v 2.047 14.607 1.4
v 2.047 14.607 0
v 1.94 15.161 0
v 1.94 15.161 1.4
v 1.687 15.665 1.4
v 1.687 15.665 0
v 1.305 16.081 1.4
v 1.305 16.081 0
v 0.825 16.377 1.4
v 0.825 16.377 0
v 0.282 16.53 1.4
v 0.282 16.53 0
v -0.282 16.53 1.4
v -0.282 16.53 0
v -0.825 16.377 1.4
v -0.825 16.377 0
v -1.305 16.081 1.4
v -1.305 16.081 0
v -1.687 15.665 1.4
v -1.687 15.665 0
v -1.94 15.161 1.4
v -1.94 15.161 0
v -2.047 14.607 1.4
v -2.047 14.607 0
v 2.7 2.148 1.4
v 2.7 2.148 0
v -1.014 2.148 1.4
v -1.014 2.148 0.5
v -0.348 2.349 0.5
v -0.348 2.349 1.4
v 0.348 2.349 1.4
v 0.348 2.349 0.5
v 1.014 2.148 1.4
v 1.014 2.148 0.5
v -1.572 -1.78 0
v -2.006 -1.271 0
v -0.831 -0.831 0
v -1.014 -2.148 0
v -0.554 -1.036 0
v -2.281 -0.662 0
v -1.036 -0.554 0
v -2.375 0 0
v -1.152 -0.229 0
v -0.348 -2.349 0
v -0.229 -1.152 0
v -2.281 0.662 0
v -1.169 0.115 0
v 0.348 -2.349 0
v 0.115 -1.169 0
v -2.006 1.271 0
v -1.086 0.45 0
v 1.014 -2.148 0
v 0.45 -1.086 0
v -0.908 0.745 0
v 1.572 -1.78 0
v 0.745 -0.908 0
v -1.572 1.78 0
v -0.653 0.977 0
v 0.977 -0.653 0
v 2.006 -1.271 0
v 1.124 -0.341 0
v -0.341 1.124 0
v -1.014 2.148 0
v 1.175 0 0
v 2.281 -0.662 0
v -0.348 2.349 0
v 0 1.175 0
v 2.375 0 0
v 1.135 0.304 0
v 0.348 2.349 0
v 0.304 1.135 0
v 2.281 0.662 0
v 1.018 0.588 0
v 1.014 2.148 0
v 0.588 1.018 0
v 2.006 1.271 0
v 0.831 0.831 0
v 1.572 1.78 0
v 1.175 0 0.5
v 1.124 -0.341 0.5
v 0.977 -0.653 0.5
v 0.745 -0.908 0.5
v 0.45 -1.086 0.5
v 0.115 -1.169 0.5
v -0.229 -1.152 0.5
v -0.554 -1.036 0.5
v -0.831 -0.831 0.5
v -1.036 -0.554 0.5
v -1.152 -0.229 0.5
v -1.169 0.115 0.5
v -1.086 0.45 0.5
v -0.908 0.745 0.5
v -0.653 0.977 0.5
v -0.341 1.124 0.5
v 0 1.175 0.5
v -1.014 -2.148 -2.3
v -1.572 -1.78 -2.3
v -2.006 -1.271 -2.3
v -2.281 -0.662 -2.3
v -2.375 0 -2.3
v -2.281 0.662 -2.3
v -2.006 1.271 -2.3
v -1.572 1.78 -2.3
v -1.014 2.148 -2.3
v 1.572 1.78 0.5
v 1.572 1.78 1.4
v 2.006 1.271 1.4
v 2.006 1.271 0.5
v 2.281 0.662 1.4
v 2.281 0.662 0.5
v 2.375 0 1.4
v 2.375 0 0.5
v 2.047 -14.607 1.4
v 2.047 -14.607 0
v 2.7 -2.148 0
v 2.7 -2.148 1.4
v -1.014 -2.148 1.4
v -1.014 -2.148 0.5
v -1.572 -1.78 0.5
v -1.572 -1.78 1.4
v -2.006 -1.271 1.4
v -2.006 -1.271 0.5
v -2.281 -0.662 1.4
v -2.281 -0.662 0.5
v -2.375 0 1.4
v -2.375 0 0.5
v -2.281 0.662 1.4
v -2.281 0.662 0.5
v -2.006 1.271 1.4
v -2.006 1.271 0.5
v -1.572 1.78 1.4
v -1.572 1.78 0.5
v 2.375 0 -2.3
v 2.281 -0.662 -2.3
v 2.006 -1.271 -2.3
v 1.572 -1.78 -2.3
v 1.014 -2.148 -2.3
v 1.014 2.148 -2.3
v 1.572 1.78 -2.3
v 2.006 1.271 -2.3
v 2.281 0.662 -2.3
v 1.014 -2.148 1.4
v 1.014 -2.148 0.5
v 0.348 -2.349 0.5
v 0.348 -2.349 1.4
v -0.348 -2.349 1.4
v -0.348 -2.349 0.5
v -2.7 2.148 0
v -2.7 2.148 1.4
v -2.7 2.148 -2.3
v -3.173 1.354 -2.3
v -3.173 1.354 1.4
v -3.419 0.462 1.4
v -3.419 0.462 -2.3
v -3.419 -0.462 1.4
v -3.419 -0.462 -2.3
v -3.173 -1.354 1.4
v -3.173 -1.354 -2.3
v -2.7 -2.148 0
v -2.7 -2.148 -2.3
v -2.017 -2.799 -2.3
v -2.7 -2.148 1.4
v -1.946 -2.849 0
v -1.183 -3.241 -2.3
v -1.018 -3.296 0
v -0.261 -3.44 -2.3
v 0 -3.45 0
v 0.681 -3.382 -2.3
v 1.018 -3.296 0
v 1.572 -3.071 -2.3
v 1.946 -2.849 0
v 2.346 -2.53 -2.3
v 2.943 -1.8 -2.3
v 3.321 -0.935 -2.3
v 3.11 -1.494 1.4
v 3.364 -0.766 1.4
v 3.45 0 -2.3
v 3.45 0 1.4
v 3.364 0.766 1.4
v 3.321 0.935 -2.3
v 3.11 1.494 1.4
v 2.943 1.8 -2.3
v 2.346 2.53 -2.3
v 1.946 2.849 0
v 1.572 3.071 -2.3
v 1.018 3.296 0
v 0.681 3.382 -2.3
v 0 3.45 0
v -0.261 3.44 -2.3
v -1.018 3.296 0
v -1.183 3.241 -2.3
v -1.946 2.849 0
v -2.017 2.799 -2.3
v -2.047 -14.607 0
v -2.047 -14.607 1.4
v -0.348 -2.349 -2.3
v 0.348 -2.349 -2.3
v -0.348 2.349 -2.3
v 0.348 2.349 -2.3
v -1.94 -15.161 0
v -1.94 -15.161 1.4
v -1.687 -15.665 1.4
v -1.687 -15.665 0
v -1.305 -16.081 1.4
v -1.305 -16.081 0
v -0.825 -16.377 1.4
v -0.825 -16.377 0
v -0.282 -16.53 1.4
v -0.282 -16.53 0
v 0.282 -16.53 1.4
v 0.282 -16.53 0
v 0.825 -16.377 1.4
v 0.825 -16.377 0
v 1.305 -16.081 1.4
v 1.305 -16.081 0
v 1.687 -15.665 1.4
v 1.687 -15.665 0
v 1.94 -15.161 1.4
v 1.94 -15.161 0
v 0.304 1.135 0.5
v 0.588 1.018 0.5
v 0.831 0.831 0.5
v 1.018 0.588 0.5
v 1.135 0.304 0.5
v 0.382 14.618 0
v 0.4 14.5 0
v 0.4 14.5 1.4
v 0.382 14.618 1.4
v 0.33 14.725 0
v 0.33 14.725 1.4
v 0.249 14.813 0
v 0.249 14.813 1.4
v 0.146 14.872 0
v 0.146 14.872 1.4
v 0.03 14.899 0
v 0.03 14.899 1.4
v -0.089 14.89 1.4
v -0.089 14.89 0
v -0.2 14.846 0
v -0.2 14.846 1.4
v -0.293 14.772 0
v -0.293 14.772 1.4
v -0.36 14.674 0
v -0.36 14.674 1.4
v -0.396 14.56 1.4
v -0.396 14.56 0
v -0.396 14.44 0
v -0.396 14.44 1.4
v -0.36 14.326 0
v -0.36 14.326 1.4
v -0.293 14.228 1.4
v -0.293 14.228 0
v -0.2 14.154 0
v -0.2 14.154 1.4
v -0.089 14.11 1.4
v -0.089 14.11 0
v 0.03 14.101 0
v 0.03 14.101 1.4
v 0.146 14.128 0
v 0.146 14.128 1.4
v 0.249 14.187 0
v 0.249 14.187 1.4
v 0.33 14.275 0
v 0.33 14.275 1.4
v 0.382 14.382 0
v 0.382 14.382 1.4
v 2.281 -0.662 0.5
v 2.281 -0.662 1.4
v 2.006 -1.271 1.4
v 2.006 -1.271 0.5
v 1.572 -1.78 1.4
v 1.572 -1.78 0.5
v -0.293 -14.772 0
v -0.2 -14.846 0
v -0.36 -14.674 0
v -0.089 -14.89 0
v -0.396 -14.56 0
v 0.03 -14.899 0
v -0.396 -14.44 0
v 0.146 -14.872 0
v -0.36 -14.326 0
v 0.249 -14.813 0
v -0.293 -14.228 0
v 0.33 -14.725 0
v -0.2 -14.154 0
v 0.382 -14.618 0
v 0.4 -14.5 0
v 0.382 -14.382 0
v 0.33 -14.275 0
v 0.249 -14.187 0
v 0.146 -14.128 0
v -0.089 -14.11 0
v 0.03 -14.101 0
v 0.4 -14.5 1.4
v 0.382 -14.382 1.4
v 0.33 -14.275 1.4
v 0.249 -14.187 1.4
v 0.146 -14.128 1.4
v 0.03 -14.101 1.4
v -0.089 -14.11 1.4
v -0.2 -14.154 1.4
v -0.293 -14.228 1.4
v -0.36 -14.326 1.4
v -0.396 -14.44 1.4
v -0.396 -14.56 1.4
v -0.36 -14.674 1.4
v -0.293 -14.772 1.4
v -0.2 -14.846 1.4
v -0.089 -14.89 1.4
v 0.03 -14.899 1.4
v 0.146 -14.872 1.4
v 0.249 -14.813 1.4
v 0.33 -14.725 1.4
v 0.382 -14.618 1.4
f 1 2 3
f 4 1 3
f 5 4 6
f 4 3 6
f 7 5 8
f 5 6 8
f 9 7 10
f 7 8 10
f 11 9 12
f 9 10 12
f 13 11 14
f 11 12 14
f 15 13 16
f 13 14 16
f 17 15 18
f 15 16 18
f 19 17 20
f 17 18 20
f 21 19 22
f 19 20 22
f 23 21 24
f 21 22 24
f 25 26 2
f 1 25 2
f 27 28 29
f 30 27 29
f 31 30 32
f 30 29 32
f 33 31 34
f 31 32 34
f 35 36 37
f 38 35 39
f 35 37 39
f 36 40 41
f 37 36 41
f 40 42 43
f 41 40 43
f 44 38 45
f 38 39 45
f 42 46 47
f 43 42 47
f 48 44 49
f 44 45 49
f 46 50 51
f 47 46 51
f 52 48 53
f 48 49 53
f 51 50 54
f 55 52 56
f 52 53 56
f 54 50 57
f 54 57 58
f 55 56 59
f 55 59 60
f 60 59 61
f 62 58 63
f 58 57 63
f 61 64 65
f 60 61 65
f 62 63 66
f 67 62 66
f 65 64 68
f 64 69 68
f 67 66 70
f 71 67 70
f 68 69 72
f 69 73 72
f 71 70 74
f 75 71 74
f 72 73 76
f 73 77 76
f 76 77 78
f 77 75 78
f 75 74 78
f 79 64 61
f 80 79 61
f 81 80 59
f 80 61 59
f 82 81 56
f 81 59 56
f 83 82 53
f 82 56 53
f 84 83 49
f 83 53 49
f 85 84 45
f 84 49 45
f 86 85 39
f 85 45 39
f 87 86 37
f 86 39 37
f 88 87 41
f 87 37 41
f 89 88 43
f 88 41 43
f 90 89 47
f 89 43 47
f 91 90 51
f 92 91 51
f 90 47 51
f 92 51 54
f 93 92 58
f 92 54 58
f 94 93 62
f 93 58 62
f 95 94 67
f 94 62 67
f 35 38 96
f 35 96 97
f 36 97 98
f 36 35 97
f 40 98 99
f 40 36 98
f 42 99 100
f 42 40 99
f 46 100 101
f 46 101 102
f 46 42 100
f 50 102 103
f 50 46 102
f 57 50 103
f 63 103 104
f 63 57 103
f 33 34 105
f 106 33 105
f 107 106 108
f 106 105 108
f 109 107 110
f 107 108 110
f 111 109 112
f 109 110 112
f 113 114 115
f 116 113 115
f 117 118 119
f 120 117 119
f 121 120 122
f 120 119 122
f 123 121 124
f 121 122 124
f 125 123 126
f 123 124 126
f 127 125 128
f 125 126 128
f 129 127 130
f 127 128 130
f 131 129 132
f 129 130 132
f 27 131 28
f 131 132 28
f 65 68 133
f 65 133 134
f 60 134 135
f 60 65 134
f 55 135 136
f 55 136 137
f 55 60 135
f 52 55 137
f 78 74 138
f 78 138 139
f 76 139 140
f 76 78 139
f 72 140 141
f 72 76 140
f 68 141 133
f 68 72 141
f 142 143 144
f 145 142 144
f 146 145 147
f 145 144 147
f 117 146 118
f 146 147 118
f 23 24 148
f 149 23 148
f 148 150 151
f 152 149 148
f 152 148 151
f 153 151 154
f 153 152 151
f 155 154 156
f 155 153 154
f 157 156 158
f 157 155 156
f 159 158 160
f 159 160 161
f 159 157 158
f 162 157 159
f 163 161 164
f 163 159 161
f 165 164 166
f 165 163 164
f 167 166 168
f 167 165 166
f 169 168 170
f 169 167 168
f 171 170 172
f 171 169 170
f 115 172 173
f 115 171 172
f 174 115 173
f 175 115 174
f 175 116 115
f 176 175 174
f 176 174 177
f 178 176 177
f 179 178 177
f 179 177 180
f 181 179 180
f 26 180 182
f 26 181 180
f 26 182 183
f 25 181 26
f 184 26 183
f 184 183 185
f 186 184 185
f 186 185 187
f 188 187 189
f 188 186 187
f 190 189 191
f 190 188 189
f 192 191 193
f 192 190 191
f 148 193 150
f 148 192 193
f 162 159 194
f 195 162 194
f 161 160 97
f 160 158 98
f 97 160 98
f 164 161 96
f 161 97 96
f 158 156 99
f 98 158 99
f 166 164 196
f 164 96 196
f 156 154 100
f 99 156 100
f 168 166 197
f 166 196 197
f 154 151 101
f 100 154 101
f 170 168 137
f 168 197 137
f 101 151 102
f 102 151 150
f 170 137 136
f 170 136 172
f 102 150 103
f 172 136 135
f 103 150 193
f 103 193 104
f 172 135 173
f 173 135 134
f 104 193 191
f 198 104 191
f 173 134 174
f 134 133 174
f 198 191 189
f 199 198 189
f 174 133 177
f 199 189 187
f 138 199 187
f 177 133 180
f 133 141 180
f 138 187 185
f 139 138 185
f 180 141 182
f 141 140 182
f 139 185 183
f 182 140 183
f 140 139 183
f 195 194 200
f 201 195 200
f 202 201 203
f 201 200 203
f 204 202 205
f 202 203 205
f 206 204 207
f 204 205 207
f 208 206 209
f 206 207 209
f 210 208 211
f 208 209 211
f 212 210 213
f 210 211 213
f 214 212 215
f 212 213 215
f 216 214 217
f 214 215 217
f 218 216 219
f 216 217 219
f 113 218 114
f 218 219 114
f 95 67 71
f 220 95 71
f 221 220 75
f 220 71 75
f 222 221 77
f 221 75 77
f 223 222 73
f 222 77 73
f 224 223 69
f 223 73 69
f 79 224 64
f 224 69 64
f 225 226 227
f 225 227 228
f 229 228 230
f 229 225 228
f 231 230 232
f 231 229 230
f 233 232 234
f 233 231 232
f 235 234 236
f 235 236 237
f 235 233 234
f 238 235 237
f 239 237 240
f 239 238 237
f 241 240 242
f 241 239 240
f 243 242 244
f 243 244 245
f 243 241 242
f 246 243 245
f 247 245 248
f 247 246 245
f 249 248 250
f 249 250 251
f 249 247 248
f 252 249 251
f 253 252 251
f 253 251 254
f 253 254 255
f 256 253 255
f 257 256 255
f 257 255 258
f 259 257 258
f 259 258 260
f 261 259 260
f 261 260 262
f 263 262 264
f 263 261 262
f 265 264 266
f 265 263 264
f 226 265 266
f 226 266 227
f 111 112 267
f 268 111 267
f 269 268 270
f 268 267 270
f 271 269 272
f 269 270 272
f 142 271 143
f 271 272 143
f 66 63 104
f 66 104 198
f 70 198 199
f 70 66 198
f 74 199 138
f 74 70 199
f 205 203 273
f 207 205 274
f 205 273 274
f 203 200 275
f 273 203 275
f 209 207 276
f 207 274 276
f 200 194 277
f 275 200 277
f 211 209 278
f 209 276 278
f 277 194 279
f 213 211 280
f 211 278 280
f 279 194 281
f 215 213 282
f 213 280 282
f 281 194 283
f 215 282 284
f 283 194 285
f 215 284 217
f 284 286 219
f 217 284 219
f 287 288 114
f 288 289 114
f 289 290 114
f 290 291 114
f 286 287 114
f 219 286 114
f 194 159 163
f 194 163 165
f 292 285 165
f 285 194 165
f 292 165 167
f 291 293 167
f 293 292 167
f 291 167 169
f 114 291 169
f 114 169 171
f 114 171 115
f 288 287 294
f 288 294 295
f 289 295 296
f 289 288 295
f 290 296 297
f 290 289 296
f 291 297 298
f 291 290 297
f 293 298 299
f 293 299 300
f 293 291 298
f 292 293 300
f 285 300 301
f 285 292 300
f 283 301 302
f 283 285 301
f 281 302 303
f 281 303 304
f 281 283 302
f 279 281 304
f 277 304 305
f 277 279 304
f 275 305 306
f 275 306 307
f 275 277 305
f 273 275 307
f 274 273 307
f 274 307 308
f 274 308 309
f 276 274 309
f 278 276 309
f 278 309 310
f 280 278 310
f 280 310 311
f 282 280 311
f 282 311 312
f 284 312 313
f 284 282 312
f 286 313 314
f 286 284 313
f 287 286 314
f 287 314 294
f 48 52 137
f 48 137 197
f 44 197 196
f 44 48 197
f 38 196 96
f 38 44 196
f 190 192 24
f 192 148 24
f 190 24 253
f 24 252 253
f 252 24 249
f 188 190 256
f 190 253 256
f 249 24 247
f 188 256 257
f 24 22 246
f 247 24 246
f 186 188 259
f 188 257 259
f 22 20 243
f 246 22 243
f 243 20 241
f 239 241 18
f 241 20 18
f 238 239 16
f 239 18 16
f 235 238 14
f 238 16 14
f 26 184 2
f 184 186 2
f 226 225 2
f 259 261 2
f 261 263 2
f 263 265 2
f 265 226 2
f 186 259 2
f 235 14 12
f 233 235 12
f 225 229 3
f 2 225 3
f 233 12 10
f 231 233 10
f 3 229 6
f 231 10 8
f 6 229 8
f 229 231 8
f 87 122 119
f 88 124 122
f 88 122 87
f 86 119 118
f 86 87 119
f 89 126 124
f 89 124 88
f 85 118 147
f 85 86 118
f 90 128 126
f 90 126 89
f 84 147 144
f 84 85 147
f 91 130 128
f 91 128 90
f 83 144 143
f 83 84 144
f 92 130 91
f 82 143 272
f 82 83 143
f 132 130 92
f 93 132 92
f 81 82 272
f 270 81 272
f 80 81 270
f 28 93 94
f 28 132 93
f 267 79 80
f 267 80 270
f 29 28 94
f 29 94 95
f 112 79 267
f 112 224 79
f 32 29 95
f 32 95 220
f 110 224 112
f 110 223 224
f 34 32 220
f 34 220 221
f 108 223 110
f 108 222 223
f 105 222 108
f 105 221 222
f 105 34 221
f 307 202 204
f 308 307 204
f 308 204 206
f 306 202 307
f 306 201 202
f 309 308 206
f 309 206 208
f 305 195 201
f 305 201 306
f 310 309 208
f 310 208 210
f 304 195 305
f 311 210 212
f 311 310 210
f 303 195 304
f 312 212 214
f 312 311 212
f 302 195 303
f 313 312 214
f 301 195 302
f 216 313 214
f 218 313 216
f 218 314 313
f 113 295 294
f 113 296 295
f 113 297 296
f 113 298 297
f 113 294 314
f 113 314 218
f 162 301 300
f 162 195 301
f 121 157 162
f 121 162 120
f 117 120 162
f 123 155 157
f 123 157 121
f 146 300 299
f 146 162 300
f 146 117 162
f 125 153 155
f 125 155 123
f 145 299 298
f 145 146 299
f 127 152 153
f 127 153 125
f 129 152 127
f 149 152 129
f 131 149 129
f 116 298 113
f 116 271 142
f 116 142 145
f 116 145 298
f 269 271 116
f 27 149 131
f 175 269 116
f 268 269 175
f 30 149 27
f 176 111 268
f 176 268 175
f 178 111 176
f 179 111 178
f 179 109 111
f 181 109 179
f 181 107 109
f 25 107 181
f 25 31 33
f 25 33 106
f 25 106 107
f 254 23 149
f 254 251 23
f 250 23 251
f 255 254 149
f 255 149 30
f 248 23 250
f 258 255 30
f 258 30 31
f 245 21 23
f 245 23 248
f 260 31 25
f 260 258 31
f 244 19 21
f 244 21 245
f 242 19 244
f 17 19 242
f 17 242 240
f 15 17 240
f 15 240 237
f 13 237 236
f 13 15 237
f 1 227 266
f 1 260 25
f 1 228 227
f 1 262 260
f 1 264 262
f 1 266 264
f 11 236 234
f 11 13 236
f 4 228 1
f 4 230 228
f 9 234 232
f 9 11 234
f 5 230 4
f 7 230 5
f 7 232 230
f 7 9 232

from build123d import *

# Parameters (mm, degrees)
F0_R     = 0.4
F1_DEPTH = 1.4
F2_DEPTH = 2.3
F3_DEPTH = 0.5


with BuildPart() as f1:
    # F0 (on Top) → F1 (new body)
    with BuildSketch(Plane.XY):
        with BuildLine():
            ThreePointArc((2.7, -2.1476731595), (3.2571076126, -1.1374313166), (3.45, 0))
            ThreePointArc((3.45, 0), (3.2571076126, 1.1374313166), (2.7, 2.1476731595))
            Line((2.7, 2.1476731595), (1.0139649895, 2.1476731595))
            ThreePointArc((1.0139649895, 2.1476731595), (2.0060897101, 1.2713099838), (2.375, 0))
            ThreePointArc((2.375, 0), (2.0060897101, -1.2713099838), (1.0139649895, -2.1476731595))
            Line((1.0139649895, -2.1476731595), (2.7, -2.1476731595))
        make_face()
        with BuildLine():
            Line((1.0139649895, 2.1476731595), (2.7, 2.1476731595))
            ThreePointArc((2.7, 2.1476731595), (0, 3.45), (-2.7, 2.1476731595))
            Line((-2.7, 2.1476731595), (-1.0139649895, 2.1476731595))
            ThreePointArc((-1.0139649895, 2.1476731595), (0, 2.375), (1.0139649895, 2.1476731595))
        make_face()
        with BuildLine():
            ThreePointArc((-2.7, 2.1476731595), (0, 3.45), (2.7, 2.1476731595))
            Line((2.7, 2.1476731595), (2.0471920173, 14.6072606371))
            ThreePointArc((2.0471920173, 14.6072606371), (2.0492978841, 14.553648693), (2.05, 14.5))
            ThreePointArc((2.05, 14.5), (-0.053648693, 12.4507021159), (-2.0471920173, 14.6072606371))
            Line((-2.0471920173, 14.6072606371), (-2.7, 2.1476731595))
        make_face()
        with BuildLine():
            Line((2.0471920173, -14.6072606371), (2.7, -2.1476731595))
            ThreePointArc((2.7, -2.1476731595), (0, -3.45), (-2.7, -2.1476731595))
            Line((-2.7, -2.1476731595), (-2.0471920173, -14.6072606371))
            ThreePointArc((-2.0471920173, -14.6072606371), (-0.053648693, -12.4507021159), (2.05, -14.5))
            ThreePointArc((2.05, -14.5), (2.0492978841, -14.553648693), (2.0471920173, -14.6072606371))
        make_face()
        with BuildLine():
            ThreePointArc((-2.7, -2.1476731595), (0, -3.45), (2.7, -2.1476731595))
            Line((2.7, -2.1476731595), (1.0139649895, -2.1476731595))
            ThreePointArc((1.0139649895, -2.1476731595), (0, -2.375), (-1.0139649895, -2.1476731595))
            Line((-1.0139649895, -2.1476731595), (-2.7, -2.1476731595))
        make_face()
        with BuildLine():
            Line((-1.0139649895, 2.1476731595), (-2.7, 2.1476731595))
            ThreePointArc((-2.7, 2.1476731595), (-3.45, 0), (-2.7, -2.1476731595))
            Line((-2.7, -2.1476731595), (-1.0139649895, -2.1476731595))
            ThreePointArc((-1.0139649895, -2.1476731595), (-2.375, 0), (-1.0139649895, 2.1476731595))
        make_face()
        with BuildLine():
            ThreePointArc((2.05, 14.5), (2.0492978841, 14.553648693), (2.0471920173, 14.6072606371))
            ThreePointArc((2.0471920173, 14.6072606371), (0, 16.55), (-2.0471920173, 14.6072606371))
            ThreePointArc((-2.0471920173, 14.6072606371), (-0.053648693, 12.4507021159), (2.05, 14.5))
        make_face()
        with Locations((0, 14.5)):
            Circle(F0_R, mode=Mode.SUBTRACT)
        with BuildLine():
            ThreePointArc((-2.0471920173, -14.6072606371), (0, -16.55), (2.0471920173, -14.6072606371))
            ThreePointArc((2.0471920173, -14.6072606371), (2.0492978841, -14.553648693), (2.05, -14.5))
            ThreePointArc((2.05, -14.5), (-0.053648693, -12.4507021159), (-2.0471920173, -14.6072606371))
        make_face()
        with Locations((0, -14.5)):
            Circle(F0_R, mode=Mode.SUBTRACT)
    extrude(amount=F1_DEPTH)

    # F0 (on Top) → F2 (join)
    with BuildSketch(Plane.XY):
        with BuildLine():
            Line((-1.0139649895, 2.1476731595), (-2.7, 2.1476731595))
            ThreePointArc((-2.7, 2.1476731595), (-3.45, 0), (-2.7, -2.1476731595))
            Line((-2.7, -2.1476731595), (-1.0139649895, -2.1476731595))
            ThreePointArc((-1.0139649895, -2.1476731595), (-2.375, 0), (-1.0139649895, 2.1476731595))
        make_face()
        with BuildLine():
            Line((1.0139649895, 2.1476731595), (2.7, 2.1476731595))
            ThreePointArc((2.7, 2.1476731595), (0, 3.45), (-2.7, 2.1476731595))
            Line((-2.7, 2.1476731595), (-1.0139649895, 2.1476731595))
            ThreePointArc((-1.0139649895, 2.1476731595), (0, 2.375), (1.0139649895, 2.1476731595))
        make_face()
        with BuildLine():
            ThreePointArc((-2.7, -2.1476731595), (0, -3.45), (2.7, -2.1476731595))
            Line((2.7, -2.1476731595), (1.0139649895, -2.1476731595))
            ThreePointArc((1.0139649895, -2.1476731595), (0, -2.375), (-1.0139649895, -2.1476731595))
            Line((-1.0139649895, -2.1476731595), (-2.7, -2.1476731595))
        make_face()
        with BuildLine():
            ThreePointArc((2.7, -2.1476731595), (3.2571076126, -1.1374313166), (3.45, 0))
            ThreePointArc((3.45, 0), (3.2571076126, 1.1374313166), (2.7, 2.1476731595))
            Line((2.7, 2.1476731595), (1.0139649895, 2.1476731595))
            ThreePointArc((1.0139649895, 2.1476731595), (2.0060897101, 1.2713099838), (2.375, 0))
            ThreePointArc((2.375, 0), (2.0060897101, -1.2713099838), (1.0139649895, -2.1476731595))
            Line((1.0139649895, -2.1476731595), (2.7, -2.1476731595))
        make_face()
    extrude(amount=-F2_DEPTH)

    # F0 (on Top) → F3 (join)
    with BuildSketch(Plane.XY):
        with BuildLine():
            Line((0, 2.1476731595), (1.0139649895, 2.1476731595))
            ThreePointArc((1.0139649895, 2.1476731595), (0, 2.375), (-1.0139649895, 2.1476731595))
            Line((-1.0139649895, 2.1476731595), (0, 2.1476731595))
        make_face()
        with BuildLine():
            ThreePointArc((2.375, 0), (2.0060897101, 1.2713099838), (1.0139649895, 2.1476731595))
            Line((1.0139649895, 2.1476731595), (0, 2.1476731595))
            Line((0, 2.1476731595), (-1.0139649895, 2.1476731595))
            ThreePointArc((-1.0139649895, 2.1476731595), (-2.375, 0), (-1.0139649895, -2.1476731595))
            Line((-1.0139649895, -2.1476731595), (1.0139649895, -2.1476731595))
            ThreePointArc((1.0139649895, -2.1476731595), (2.0060897101, -1.2713099838), (2.375, 0))
        make_face()
        with BuildLine():
            ThreePointArc((1.175, 0), (-0.8308504679, -0.8308504679), (0, 1.175))
            ThreePointArc((0, 1.175), (0.8308504679, 0.8308504679), (1.175, 0))
        make_face(mode=Mode.SUBTRACT)
        with BuildLine():
            ThreePointArc((-1.0139649895, -2.1476731595), (0, -2.375), (1.0139649895, -2.1476731595))
            Line((1.0139649895, -2.1476731595), (-1.0139649895, -2.1476731595))
        make_face()
    extrude(amount=F3_DEPTH)


solid = f1.part
